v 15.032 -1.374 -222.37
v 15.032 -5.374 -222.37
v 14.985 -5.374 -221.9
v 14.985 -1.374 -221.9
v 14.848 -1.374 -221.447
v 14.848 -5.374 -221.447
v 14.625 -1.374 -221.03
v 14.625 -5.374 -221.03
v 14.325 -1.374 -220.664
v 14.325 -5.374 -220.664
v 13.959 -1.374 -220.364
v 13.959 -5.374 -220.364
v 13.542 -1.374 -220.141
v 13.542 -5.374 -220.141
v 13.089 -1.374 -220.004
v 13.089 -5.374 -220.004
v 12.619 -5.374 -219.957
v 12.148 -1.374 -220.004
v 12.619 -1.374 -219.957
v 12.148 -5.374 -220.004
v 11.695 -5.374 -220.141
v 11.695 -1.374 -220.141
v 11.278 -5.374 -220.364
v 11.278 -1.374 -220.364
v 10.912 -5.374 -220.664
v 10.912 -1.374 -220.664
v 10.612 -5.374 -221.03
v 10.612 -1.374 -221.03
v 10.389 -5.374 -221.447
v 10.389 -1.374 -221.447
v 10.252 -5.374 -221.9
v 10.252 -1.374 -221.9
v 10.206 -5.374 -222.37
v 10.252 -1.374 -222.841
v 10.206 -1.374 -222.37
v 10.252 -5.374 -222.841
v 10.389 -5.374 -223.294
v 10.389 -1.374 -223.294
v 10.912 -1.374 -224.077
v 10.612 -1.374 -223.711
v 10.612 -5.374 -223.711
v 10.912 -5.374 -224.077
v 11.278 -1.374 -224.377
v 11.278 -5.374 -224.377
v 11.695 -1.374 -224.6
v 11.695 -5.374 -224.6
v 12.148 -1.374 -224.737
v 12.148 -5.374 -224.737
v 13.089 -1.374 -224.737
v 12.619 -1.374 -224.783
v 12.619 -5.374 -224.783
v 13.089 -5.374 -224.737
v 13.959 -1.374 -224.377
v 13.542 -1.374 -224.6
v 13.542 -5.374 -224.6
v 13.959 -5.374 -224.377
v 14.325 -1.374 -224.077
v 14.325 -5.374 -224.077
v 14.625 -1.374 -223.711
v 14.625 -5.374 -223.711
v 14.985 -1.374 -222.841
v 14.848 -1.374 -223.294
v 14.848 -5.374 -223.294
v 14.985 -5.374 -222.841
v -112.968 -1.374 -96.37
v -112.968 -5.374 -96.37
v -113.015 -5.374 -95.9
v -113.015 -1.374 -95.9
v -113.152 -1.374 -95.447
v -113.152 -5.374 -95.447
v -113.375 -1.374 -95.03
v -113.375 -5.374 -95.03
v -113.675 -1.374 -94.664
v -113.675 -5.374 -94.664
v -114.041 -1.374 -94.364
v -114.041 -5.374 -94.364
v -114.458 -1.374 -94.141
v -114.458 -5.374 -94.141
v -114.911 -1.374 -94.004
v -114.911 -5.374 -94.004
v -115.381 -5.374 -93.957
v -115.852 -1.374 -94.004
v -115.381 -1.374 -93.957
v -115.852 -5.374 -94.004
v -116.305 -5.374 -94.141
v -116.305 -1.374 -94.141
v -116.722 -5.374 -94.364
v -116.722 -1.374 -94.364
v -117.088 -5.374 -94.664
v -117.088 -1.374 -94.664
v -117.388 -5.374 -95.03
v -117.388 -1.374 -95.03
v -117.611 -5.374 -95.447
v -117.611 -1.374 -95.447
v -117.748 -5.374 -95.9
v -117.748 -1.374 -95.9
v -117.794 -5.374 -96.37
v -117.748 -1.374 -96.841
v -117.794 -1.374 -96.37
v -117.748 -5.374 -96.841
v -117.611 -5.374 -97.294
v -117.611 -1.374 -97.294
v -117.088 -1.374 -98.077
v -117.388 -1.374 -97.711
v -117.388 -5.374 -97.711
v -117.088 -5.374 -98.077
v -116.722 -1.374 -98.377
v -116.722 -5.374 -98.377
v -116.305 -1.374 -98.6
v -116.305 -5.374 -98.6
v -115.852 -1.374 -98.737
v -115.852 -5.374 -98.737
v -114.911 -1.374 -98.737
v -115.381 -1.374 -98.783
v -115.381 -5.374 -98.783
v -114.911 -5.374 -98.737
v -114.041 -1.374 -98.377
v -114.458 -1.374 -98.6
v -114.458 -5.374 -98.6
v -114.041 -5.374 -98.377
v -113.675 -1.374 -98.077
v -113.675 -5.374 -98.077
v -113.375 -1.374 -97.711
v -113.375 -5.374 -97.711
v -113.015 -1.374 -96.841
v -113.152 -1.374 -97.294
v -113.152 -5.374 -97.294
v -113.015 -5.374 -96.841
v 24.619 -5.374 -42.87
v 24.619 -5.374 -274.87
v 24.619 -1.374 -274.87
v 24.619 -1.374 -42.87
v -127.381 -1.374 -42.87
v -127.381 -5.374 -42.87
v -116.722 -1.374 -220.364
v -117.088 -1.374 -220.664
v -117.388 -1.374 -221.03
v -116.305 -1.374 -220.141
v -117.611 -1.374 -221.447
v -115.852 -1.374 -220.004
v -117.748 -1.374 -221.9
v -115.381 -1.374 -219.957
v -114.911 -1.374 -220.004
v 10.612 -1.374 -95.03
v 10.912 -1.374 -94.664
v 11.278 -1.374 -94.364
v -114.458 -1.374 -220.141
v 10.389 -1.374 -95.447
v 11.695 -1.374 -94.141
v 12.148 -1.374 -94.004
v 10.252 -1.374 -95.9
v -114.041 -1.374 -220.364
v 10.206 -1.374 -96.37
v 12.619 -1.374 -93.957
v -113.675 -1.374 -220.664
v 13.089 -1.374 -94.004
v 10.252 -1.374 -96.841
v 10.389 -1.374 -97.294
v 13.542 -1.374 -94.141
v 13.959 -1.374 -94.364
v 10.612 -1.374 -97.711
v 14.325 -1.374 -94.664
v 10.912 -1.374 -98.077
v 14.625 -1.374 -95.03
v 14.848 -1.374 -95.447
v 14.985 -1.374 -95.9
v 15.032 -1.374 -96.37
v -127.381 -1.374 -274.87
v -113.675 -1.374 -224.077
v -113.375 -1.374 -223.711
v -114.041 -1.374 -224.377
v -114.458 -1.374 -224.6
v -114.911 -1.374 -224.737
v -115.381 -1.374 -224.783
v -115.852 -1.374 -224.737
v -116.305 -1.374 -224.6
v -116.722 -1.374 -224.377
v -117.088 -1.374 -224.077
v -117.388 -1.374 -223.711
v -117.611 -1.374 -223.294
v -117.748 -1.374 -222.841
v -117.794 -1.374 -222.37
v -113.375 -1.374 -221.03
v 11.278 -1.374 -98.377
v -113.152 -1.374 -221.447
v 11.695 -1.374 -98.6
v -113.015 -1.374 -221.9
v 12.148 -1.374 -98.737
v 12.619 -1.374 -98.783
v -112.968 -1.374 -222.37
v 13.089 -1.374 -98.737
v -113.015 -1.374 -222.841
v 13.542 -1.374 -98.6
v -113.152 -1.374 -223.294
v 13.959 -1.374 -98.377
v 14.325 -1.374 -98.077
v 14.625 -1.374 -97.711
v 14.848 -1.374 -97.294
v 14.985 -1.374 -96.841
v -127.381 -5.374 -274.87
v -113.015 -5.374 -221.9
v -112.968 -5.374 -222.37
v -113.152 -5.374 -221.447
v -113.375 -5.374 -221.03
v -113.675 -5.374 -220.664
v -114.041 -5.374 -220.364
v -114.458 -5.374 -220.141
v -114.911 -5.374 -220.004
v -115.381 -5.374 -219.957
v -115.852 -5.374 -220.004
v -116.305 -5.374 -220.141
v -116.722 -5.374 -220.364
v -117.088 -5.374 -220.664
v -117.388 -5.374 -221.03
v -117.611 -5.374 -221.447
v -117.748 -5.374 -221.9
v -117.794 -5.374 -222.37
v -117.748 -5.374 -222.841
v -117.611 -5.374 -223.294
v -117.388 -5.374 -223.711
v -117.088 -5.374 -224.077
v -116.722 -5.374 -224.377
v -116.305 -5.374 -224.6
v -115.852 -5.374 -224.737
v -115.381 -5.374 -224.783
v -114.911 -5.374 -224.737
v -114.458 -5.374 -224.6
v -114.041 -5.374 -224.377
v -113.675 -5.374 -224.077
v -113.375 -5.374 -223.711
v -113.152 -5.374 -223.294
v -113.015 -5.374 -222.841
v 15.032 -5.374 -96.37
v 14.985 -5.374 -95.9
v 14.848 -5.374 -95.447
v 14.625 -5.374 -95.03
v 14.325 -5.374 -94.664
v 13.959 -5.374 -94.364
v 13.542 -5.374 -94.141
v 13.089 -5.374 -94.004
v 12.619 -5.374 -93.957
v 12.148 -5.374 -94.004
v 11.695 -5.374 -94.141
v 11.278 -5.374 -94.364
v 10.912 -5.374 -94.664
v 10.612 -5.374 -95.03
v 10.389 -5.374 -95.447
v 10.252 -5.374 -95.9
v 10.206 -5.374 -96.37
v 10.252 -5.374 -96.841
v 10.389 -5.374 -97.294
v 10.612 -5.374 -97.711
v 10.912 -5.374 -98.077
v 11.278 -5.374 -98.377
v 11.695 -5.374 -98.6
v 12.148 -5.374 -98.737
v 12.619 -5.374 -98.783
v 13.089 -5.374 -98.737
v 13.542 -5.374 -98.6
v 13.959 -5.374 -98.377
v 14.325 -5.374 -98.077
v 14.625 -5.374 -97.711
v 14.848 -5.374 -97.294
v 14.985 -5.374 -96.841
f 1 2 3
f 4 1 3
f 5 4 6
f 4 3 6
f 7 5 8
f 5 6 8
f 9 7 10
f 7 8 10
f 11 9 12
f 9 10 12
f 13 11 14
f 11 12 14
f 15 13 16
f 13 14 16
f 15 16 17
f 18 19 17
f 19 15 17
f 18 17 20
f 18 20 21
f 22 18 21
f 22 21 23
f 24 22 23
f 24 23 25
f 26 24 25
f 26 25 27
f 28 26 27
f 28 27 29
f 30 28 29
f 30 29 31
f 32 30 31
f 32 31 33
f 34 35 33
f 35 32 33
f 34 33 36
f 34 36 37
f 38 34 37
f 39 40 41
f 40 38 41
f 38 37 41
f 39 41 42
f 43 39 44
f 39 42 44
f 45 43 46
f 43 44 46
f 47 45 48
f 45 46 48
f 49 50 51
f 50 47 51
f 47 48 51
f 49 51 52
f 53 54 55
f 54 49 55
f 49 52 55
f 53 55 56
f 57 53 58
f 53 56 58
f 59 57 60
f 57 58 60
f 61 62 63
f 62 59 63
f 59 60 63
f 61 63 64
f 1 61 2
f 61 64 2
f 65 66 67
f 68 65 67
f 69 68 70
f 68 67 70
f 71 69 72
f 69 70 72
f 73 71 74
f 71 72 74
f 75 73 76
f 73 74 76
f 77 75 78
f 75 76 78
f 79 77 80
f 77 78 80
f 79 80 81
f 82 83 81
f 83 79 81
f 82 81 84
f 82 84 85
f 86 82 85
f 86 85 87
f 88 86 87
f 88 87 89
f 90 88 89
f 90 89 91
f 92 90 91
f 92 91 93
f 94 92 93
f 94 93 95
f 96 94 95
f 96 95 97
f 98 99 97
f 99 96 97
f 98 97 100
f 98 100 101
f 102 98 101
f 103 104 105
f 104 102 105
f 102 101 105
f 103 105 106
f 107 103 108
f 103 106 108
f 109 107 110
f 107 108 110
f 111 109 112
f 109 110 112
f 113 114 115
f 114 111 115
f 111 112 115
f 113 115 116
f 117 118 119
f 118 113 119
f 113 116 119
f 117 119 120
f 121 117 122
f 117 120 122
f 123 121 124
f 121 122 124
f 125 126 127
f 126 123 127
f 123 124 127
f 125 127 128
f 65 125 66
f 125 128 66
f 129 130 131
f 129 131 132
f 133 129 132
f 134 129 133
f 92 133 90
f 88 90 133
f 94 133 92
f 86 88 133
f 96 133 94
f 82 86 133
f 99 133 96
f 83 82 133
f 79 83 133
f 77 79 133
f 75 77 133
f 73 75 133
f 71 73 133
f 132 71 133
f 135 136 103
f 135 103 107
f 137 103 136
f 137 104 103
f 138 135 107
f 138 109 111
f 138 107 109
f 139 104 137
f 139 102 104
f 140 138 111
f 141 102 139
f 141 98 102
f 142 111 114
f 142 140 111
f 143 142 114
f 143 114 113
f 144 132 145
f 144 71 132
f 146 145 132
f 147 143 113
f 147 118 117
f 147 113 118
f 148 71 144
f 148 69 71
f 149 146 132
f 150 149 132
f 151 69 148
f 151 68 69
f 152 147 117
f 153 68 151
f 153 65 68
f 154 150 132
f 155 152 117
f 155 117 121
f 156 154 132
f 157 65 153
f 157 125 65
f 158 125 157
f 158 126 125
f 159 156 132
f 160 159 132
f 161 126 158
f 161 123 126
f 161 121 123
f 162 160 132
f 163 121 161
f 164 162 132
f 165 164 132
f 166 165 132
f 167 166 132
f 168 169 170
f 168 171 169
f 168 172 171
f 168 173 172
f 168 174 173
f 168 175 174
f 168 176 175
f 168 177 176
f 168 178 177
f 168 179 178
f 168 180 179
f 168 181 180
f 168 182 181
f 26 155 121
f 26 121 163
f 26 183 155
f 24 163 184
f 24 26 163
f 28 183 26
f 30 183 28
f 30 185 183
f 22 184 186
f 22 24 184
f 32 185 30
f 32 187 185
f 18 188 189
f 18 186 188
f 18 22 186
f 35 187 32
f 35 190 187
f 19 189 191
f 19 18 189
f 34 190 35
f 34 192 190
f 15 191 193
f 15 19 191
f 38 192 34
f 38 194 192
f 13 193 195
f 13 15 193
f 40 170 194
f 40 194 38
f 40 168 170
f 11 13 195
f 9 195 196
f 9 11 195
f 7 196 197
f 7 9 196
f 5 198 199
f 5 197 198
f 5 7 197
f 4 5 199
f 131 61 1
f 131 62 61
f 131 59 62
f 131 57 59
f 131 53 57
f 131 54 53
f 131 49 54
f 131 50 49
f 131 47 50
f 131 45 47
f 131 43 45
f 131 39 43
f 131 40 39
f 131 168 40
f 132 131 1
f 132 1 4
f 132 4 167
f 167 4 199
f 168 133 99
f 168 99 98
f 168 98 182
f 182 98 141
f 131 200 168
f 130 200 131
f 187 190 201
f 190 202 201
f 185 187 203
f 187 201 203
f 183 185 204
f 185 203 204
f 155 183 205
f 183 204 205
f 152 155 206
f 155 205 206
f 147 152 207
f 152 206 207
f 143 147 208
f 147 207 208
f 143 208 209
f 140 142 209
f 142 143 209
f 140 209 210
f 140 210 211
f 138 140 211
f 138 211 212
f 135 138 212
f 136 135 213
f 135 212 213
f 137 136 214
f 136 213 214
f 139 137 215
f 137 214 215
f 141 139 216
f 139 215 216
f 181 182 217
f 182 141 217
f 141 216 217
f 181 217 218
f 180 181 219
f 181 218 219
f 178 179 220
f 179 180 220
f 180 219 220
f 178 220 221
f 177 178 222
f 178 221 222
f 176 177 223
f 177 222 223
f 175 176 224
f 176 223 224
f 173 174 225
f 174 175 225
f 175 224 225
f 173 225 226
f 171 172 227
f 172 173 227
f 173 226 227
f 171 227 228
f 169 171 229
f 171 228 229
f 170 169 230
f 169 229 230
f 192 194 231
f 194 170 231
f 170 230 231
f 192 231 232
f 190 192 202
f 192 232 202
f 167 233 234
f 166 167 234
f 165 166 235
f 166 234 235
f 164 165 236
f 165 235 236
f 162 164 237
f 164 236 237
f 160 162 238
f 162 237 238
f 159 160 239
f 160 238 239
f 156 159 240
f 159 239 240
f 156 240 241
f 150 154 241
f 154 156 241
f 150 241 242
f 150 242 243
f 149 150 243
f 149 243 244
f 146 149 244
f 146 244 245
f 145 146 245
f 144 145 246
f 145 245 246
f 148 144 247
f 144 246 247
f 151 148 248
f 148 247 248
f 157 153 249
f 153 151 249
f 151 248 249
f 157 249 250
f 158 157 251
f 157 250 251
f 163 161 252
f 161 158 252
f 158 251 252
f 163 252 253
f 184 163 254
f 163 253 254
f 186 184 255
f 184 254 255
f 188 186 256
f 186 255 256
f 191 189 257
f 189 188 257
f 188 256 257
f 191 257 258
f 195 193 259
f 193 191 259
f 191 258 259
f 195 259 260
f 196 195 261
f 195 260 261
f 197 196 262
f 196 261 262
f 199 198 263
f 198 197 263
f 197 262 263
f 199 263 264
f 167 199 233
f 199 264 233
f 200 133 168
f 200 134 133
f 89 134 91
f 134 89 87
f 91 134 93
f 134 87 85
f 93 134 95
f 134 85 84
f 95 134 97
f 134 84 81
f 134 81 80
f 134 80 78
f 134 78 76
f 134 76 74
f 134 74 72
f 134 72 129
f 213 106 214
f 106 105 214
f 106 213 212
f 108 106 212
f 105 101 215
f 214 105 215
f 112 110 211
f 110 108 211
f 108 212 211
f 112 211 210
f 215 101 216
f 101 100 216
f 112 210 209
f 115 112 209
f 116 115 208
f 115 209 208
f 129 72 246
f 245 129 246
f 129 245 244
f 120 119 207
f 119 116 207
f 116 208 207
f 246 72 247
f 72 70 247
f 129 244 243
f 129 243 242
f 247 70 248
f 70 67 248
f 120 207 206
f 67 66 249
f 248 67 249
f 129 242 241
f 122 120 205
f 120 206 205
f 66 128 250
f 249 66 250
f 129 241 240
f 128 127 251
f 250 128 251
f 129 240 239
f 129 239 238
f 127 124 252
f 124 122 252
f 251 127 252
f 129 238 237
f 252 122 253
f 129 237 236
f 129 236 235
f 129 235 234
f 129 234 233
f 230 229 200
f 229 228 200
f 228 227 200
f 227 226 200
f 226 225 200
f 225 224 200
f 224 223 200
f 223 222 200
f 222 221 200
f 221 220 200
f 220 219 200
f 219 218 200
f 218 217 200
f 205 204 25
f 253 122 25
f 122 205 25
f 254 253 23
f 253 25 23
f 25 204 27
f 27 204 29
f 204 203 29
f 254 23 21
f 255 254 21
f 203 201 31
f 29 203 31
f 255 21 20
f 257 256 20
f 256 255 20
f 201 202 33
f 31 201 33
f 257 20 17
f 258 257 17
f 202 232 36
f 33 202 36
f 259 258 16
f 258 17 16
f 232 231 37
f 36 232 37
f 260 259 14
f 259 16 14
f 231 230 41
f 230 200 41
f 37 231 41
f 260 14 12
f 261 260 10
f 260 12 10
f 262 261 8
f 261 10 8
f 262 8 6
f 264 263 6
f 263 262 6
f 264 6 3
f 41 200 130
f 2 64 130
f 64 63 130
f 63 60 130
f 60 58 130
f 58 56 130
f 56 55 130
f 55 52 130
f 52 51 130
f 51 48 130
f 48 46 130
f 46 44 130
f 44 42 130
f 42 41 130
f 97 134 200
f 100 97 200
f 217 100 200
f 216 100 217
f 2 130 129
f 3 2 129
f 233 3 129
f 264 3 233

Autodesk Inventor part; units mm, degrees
ref_plane "YZ Plane" through (0, 0, 0) normal (1, 0, 0) x (0, 1, 0)
ref_plane "XZ Plane" through (0, 0, 0) normal (0, 1, 0) x (-1, 0, 0)
ref_plane "XY Plane" through (0, 0, 0) normal (0, 0, 1) x (1, 0, 0)
ref_plane "Work Plane1" through (-51.3814, -5.3745, -158.8704) normal (0, 1, 0) x (1, 0, 0)
sketch "Sketch1" plane through (-51.3814, -5.3745, -158.8704) normal (0, 1, 0) x (1, 0, 0)
  line L0 (74, 114.5) -> (74, 71.5) projected
  line L1 (-74, 114.5) -> (74, 114.5) projected
  line L2 (-74, 71.5) -> (-74, 114.5) projected
  line L3 (-64, 71.5) -> (-74, 71.5) projected
  arc A0 (-64, 55.5) -> (-64, 71.5) centre (-64, 63.5) ccw projected
  line L4 (-74, 55.5) -> (-64, 55.5) projected
  line L5 (-74, -54.5) -> (-74, 55.5) projected
  line L6 (-64, -54.5) -> (-74, -54.5) projected
  arc A1 (-64, -70.5) -> (-64, -54.5) centre (-64, -62.5) ccw projected
  line L7 (-74, -70.5) -> (-64, -70.5) projected
  line L8 (-74, -114.5) -> (-74, -70.5) projected
  line L9 (74, -114.5) -> (-74, -114.5) projected
  line L10 (74, -70.5) -> (74, -114.5) projected
  line L11 (64, -70.5) -> (74, -70.5) projected
  arc A2 (64, -54.5) -> (64, -70.5) centre (64, -62.5) ccw projected
  line L12 (74, -54.5) -> (64, -54.5) projected
  line L13 (74, 55.5) -> (74, -54.5) projected
  line L14 (64, 55.5) -> (74, 55.5) projected
  arc A3 (64, 71.5) -> (64, 55.5) centre (64, 63.5) ccw projected
  line L15 (74, 71.5) -> (64, 71.5) projected
  line L16 (0, 114.5) -> (0, -114.5) construction
  line L17 (-76, 116) -> (76, 116)
  line L18 (76, 116) -> (76, -116)
  line L19 (76, -116) -> (-76, -116)
  line L20 (-76, -116) -> (-76, 116)
  line L21 (-76, 116) -> (76, -116) construction
  line L22 (76, 116) -> (-76, -116) construction
  circle A4 centre (-64, -62.5) radius 2.413
  circle A5 centre (-64, 63.5) radius 2.413
  circle A6 centre (64, 63.5) radius 2.413
  circle A7 centre (64, -62.5) radius 2.413
  point P0 (51.3814, -158.8704)
  point P1 (0, 0)
  dimension "d0" = 152
  dimension "d1" = 232
  dimension "d2" = 4.826
  dimension "d3" = 4.826
  dimension "d4" = 4.826
  dimension "d5" = 4.826
extrude "Extrusion1" add sketch "Sketch1" along normal blind 4 contours L0 L15 A3 L14 L13 L12 A2 L11 L10 L9 L8 L7 A1 L6 L5 L4 A0 L3 L2 L1 | L17 L18 L19 L20
properties part number "bed_plate"
